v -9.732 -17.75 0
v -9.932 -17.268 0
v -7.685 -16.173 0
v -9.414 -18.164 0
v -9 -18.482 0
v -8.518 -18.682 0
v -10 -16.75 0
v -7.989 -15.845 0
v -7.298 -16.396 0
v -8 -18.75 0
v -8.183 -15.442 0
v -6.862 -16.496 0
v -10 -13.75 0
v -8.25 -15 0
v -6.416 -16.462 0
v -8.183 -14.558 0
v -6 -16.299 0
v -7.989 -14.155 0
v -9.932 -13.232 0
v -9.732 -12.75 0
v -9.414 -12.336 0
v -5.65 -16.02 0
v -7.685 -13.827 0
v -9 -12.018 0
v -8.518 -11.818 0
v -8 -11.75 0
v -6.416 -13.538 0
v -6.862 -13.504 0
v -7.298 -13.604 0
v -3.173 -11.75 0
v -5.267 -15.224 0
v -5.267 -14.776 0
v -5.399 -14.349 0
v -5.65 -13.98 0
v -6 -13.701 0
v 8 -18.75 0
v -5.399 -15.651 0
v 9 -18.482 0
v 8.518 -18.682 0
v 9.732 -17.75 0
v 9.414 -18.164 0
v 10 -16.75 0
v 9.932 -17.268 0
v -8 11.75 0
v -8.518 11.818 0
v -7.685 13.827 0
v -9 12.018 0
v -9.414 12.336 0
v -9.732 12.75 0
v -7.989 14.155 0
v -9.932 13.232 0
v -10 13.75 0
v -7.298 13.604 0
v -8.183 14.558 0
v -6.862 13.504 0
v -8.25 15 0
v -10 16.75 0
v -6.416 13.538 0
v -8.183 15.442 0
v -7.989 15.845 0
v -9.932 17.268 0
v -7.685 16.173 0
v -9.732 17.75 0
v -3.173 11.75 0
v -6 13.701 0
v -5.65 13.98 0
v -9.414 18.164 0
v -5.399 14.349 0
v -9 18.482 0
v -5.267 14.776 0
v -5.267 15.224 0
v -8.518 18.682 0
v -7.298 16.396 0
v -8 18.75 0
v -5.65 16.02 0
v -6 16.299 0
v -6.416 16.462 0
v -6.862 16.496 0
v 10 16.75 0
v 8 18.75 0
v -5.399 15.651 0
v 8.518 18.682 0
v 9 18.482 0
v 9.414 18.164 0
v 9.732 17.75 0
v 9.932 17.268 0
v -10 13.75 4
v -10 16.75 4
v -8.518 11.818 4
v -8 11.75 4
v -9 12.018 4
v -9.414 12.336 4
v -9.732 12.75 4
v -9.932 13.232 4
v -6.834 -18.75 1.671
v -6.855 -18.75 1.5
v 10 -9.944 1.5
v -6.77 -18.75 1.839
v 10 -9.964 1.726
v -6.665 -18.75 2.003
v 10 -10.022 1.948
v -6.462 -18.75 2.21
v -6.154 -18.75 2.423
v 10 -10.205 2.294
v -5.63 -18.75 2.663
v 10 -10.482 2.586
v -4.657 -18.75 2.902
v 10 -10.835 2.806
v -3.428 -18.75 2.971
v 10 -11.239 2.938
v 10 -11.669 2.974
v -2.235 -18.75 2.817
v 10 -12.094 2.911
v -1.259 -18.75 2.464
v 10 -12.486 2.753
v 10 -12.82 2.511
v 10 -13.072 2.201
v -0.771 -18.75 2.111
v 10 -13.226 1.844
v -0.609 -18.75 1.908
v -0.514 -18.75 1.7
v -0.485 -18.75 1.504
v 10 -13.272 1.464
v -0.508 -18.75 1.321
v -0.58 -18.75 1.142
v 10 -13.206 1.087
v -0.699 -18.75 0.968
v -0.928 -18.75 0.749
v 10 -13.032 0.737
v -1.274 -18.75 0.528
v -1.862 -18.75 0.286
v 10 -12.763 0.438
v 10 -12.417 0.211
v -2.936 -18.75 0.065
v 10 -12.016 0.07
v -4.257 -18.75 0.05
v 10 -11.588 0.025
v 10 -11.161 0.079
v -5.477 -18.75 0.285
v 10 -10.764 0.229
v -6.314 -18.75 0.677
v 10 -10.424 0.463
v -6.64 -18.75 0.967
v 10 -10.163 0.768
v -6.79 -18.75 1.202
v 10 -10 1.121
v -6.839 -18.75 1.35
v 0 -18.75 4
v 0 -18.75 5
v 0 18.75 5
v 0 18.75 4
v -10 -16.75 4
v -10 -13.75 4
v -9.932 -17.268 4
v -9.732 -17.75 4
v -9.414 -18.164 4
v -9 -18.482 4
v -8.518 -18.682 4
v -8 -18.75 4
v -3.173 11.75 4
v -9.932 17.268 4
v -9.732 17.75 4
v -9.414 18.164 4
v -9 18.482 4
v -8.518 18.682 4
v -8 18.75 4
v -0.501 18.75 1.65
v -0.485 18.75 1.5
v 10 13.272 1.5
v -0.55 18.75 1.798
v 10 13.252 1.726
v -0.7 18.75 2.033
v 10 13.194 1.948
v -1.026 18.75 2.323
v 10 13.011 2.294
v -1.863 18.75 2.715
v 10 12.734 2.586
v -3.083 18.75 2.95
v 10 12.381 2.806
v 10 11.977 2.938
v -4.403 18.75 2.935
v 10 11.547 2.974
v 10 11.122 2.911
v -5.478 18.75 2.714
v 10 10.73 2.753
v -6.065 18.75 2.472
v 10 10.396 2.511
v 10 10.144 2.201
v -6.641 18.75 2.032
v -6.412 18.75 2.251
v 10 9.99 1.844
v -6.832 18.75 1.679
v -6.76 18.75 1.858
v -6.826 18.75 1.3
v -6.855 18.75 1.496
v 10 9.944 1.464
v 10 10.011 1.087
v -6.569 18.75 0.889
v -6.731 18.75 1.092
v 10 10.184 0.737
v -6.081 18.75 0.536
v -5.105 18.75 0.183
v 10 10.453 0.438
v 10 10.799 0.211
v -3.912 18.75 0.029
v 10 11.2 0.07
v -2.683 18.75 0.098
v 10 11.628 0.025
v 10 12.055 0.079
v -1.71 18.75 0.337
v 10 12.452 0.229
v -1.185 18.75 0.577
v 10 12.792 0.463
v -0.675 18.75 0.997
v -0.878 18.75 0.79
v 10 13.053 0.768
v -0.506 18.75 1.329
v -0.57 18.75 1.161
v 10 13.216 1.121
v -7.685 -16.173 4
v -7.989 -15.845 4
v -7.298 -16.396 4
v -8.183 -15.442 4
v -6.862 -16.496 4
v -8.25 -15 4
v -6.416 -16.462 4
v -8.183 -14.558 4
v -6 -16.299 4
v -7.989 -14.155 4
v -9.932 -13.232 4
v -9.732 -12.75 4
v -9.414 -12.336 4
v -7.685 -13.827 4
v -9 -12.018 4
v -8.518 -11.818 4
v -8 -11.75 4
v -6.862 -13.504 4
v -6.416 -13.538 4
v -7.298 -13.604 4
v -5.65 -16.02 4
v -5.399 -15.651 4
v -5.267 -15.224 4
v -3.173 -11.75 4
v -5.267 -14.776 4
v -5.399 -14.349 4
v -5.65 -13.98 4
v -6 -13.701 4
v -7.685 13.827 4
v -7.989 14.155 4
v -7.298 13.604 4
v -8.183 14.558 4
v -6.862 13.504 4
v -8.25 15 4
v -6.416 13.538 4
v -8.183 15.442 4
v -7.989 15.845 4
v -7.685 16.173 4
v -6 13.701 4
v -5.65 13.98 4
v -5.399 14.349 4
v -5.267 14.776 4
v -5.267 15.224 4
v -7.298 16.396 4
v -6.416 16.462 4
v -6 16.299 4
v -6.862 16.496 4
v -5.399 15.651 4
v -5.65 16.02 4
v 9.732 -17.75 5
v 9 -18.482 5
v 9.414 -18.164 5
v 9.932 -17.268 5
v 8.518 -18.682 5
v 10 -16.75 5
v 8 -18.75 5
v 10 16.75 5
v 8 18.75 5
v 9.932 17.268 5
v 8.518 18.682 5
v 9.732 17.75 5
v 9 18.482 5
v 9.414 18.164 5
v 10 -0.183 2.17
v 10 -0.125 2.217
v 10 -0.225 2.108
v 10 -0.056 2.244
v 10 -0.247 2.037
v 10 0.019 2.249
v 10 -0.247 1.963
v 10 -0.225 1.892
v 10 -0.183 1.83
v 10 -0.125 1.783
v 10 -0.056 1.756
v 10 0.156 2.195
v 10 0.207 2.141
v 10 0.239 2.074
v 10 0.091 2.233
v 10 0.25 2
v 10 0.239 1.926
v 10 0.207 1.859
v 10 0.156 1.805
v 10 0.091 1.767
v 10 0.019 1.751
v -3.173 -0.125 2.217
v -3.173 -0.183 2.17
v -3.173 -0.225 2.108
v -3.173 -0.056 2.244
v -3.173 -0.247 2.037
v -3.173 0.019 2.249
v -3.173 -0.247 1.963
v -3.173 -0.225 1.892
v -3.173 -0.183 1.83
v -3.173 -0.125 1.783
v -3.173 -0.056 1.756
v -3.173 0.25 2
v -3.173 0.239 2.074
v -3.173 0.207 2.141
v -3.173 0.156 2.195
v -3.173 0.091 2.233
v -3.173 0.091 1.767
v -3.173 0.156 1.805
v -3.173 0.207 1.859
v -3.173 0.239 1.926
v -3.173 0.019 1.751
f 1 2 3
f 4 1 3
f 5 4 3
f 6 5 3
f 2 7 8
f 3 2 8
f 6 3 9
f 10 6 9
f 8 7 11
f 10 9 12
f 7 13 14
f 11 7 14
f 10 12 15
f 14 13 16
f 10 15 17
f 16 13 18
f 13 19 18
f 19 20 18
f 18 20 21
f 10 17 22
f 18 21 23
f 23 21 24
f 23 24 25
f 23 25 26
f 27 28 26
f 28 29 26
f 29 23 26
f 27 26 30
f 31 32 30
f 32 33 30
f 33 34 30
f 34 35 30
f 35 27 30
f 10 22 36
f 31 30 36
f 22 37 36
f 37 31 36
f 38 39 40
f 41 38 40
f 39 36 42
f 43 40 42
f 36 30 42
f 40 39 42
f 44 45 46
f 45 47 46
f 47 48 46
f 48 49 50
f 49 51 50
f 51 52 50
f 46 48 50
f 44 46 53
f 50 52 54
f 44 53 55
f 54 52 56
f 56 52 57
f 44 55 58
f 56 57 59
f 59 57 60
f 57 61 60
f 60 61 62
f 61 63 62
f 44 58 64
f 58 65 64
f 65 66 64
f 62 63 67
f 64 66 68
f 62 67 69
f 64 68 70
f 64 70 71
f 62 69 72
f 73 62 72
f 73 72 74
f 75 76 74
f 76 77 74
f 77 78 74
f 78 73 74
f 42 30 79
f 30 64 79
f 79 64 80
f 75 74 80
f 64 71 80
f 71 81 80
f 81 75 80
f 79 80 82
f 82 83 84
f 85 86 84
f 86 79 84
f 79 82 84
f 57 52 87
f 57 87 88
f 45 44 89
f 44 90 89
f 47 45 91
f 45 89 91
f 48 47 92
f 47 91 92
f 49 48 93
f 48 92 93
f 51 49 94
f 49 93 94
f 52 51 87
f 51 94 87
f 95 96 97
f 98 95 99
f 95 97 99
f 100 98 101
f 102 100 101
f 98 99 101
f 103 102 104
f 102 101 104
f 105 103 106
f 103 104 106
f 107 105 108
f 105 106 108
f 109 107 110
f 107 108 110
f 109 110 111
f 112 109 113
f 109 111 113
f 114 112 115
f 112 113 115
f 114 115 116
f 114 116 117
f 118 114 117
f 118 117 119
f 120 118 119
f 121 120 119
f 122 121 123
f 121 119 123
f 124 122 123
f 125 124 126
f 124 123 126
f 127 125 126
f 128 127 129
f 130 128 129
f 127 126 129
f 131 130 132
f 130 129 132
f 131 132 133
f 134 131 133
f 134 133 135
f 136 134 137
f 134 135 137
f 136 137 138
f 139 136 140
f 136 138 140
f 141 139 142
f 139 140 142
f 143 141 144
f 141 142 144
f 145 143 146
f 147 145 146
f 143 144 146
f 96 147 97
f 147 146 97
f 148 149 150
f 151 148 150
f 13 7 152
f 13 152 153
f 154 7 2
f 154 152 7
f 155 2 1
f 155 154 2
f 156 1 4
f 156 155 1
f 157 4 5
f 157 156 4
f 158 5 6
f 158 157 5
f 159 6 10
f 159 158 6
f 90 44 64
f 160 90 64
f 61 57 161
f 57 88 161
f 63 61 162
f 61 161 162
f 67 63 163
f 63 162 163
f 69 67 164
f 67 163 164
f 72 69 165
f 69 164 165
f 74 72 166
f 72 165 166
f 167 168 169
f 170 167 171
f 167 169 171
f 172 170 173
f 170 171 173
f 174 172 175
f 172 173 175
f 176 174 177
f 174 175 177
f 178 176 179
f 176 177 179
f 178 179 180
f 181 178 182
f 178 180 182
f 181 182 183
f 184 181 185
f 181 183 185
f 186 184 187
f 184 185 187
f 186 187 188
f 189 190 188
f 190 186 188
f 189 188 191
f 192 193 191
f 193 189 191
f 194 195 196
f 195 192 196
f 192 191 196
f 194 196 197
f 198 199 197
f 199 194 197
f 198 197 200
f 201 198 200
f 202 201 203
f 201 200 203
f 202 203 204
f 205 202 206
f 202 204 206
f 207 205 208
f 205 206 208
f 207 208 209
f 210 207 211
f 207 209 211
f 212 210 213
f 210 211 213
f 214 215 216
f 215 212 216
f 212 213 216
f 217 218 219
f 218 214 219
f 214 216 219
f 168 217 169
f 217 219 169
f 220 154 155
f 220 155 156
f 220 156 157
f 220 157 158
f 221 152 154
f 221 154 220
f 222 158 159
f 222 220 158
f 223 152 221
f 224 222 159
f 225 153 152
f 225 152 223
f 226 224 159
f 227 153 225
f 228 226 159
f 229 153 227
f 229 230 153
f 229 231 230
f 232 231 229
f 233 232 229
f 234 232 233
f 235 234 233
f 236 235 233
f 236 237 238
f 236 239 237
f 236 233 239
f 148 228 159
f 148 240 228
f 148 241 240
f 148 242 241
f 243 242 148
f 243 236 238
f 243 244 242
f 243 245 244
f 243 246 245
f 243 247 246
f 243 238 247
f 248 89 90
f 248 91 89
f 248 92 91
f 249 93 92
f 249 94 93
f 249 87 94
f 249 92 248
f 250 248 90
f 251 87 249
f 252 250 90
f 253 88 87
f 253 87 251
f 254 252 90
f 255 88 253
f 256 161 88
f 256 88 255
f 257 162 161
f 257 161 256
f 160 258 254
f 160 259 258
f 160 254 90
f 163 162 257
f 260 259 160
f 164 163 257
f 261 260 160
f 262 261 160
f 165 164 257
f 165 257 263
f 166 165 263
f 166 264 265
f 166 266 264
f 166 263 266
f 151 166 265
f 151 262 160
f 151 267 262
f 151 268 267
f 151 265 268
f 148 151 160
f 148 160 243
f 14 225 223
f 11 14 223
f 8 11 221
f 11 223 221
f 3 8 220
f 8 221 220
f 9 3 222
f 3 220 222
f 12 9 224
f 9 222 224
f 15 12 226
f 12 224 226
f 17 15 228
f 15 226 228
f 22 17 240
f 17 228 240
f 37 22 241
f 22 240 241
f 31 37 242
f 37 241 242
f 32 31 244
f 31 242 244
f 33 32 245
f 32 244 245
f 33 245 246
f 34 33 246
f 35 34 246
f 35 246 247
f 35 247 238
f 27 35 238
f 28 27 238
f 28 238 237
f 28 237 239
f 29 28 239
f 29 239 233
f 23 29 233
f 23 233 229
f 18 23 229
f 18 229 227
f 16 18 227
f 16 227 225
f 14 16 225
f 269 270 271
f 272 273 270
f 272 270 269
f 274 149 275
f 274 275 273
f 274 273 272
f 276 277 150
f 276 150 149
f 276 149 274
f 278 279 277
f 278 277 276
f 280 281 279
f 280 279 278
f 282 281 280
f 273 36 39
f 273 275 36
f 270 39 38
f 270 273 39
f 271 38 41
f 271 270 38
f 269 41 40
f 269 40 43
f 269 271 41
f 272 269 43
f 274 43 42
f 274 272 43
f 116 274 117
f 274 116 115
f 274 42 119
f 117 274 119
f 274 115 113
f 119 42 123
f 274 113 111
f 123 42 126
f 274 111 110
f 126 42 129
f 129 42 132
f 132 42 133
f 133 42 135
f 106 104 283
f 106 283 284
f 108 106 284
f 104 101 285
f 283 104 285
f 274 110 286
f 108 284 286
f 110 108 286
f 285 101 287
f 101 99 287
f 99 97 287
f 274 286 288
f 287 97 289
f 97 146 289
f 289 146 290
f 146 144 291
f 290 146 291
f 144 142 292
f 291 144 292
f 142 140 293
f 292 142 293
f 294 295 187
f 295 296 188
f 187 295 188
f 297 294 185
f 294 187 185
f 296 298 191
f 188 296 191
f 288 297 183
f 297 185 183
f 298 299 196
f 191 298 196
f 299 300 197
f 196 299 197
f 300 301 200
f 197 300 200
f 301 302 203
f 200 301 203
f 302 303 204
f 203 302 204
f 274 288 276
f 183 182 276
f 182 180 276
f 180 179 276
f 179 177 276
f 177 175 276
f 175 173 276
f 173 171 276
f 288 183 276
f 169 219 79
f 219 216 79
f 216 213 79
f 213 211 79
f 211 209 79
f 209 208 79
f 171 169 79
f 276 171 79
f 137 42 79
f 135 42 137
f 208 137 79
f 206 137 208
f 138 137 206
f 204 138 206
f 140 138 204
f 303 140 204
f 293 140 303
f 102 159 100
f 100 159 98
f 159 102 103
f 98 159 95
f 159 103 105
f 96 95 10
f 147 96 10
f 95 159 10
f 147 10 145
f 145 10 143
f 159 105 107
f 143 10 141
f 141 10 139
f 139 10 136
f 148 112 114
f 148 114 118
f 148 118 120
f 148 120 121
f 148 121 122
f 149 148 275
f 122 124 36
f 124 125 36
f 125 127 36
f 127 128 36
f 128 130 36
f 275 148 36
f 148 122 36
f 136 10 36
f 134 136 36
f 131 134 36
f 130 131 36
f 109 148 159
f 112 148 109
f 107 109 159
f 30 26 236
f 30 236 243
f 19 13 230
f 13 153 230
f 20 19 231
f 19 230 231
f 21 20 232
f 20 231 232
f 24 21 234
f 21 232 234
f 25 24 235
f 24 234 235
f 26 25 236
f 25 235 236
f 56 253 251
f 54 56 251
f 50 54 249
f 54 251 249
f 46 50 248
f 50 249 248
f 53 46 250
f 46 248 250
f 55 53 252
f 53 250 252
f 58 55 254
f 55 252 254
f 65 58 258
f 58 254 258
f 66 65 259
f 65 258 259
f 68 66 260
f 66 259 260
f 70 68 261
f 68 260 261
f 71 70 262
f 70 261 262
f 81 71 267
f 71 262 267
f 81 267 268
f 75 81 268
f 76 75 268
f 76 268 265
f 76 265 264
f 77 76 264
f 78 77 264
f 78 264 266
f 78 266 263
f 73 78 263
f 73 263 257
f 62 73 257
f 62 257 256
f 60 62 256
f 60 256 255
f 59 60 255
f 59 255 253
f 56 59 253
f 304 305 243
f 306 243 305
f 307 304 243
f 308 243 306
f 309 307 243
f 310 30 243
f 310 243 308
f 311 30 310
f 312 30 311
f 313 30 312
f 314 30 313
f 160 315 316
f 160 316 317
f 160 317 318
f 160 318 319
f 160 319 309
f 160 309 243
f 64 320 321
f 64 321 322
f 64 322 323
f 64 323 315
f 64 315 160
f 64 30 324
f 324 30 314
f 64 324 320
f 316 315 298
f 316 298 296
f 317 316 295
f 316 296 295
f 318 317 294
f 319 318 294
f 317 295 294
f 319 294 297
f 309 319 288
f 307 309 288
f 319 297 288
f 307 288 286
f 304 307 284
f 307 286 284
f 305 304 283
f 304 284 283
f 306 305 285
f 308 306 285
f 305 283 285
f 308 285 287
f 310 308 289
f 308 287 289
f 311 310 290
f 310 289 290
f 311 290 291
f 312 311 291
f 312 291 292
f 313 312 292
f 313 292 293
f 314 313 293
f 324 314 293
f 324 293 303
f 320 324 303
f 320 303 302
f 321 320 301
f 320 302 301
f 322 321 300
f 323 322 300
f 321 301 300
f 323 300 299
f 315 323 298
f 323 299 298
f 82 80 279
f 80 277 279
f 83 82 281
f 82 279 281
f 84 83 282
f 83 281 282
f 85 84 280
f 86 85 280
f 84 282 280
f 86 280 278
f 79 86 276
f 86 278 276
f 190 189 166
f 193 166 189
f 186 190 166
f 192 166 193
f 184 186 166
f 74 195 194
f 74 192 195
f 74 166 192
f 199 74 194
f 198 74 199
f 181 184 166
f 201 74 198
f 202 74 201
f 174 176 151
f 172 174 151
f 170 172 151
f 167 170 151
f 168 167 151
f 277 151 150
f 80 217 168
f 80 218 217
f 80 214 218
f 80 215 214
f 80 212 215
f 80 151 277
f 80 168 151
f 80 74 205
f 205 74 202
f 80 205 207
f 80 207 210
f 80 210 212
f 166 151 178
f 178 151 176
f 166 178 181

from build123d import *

# Parameters (mm, degrees)
F0_W      = 20
F0_H      = 37.5
F1_DEPTH  = 5
F2_W      = 10
F2_H      = 37.5
F3_DEPTH  = 1
F5_D      = 3
F6_W      = 6.8271449069
F6_H      = 23.5
F7_DEPTH  = 6
F8_R      = 2
F12_R     = 1.475
F13_DEPTH = 26
F16_R     = 1.475
F17_DEPTH = 27.5
F19_R     = 0.25
F20_DEPTH = 27.5


with BuildPart() as f1:
    # F0 (on Top) → F1 (new body)
    with BuildSketch(Plane.XY):
        Rectangle(F0_W, F0_H)
    extrude(amount=F1_DEPTH)

    # F2 (on face) → F3 (cut)
    with BuildSketch(Plane.XY.offset(5)):
        with Locations((-5, 0)):
            Rectangle(F2_W, F2_H)
    extrude(amount=-F3_DEPTH, mode=Mode.SUBTRACT)

    # F5 (through all)
    with Locations(Plane(origin=(0, 0, 0), x_dir=(1, 0, 0), z_dir=(0, 0, -1))):
        with Locations((-6.75, 15), (-6.75, -15)):
            Hole(F5_D / 2)

    # F6 (on Top) → F7 (cut)
    with BuildSketch(Plane.XY):
        with Locations((-6.5864275466, 0)):
            Rectangle(F6_W, F6_H)
    extrude(amount=F7_DEPTH, mode=Mode.SUBTRACT)

    # F8
    f8_edges = [f1.edges().sort_by_distance(p)[0] for p in [
        (-10, -18.75, 2),
        (10, -18.75, 2.5),
        (10, 18.75, 2.5),
        (-10, 18.75, 2),
        (-10, -11.75, 2),
        (-10, 11.75, 2),
    ]]
    fillet(f8_edges, radius=F8_R)

    # F12 (on line) → F13 (cut, symmetric)
    with BuildSketch(Plane(origin=(2.3968290702, -1.2522454416, 0), x_dir=(0.4630676024, 0.8863229635, 0), z_dir=(0.8863229635, -0.4630676024, 0))):
        with Locations((14.9191381368, 1.5)):
            Circle(F12_R)
    extrude(amount=F13_DEPTH, both=True, mode=Mode.SUBTRACT)

    # F16 (on line) → F17 (cut, symmetric)
    with BuildSketch(Plane(origin=(-0.5234543941, -0.2734835734, 0), x_dir=(-0.4630676024, 0.8863229635, 0), z_dir=(0.8863229635, 0.4630676024, 0))):
        with Locations((-14.9191381368, 1.5)):
            Circle(F16_R)
    extrude(amount=F17_DEPTH, both=True, mode=Mode.SUBTRACT)

    # F19 (on face) → F20 (cut, symmetric)
    with BuildSketch(Plane.YZ.offset(10)):
        with Locations((0, 2)):
            Circle(F19_R)
    extrude(amount=F20_DEPTH, both=True, mode=Mode.SUBTRACT)


solid = f1.part
